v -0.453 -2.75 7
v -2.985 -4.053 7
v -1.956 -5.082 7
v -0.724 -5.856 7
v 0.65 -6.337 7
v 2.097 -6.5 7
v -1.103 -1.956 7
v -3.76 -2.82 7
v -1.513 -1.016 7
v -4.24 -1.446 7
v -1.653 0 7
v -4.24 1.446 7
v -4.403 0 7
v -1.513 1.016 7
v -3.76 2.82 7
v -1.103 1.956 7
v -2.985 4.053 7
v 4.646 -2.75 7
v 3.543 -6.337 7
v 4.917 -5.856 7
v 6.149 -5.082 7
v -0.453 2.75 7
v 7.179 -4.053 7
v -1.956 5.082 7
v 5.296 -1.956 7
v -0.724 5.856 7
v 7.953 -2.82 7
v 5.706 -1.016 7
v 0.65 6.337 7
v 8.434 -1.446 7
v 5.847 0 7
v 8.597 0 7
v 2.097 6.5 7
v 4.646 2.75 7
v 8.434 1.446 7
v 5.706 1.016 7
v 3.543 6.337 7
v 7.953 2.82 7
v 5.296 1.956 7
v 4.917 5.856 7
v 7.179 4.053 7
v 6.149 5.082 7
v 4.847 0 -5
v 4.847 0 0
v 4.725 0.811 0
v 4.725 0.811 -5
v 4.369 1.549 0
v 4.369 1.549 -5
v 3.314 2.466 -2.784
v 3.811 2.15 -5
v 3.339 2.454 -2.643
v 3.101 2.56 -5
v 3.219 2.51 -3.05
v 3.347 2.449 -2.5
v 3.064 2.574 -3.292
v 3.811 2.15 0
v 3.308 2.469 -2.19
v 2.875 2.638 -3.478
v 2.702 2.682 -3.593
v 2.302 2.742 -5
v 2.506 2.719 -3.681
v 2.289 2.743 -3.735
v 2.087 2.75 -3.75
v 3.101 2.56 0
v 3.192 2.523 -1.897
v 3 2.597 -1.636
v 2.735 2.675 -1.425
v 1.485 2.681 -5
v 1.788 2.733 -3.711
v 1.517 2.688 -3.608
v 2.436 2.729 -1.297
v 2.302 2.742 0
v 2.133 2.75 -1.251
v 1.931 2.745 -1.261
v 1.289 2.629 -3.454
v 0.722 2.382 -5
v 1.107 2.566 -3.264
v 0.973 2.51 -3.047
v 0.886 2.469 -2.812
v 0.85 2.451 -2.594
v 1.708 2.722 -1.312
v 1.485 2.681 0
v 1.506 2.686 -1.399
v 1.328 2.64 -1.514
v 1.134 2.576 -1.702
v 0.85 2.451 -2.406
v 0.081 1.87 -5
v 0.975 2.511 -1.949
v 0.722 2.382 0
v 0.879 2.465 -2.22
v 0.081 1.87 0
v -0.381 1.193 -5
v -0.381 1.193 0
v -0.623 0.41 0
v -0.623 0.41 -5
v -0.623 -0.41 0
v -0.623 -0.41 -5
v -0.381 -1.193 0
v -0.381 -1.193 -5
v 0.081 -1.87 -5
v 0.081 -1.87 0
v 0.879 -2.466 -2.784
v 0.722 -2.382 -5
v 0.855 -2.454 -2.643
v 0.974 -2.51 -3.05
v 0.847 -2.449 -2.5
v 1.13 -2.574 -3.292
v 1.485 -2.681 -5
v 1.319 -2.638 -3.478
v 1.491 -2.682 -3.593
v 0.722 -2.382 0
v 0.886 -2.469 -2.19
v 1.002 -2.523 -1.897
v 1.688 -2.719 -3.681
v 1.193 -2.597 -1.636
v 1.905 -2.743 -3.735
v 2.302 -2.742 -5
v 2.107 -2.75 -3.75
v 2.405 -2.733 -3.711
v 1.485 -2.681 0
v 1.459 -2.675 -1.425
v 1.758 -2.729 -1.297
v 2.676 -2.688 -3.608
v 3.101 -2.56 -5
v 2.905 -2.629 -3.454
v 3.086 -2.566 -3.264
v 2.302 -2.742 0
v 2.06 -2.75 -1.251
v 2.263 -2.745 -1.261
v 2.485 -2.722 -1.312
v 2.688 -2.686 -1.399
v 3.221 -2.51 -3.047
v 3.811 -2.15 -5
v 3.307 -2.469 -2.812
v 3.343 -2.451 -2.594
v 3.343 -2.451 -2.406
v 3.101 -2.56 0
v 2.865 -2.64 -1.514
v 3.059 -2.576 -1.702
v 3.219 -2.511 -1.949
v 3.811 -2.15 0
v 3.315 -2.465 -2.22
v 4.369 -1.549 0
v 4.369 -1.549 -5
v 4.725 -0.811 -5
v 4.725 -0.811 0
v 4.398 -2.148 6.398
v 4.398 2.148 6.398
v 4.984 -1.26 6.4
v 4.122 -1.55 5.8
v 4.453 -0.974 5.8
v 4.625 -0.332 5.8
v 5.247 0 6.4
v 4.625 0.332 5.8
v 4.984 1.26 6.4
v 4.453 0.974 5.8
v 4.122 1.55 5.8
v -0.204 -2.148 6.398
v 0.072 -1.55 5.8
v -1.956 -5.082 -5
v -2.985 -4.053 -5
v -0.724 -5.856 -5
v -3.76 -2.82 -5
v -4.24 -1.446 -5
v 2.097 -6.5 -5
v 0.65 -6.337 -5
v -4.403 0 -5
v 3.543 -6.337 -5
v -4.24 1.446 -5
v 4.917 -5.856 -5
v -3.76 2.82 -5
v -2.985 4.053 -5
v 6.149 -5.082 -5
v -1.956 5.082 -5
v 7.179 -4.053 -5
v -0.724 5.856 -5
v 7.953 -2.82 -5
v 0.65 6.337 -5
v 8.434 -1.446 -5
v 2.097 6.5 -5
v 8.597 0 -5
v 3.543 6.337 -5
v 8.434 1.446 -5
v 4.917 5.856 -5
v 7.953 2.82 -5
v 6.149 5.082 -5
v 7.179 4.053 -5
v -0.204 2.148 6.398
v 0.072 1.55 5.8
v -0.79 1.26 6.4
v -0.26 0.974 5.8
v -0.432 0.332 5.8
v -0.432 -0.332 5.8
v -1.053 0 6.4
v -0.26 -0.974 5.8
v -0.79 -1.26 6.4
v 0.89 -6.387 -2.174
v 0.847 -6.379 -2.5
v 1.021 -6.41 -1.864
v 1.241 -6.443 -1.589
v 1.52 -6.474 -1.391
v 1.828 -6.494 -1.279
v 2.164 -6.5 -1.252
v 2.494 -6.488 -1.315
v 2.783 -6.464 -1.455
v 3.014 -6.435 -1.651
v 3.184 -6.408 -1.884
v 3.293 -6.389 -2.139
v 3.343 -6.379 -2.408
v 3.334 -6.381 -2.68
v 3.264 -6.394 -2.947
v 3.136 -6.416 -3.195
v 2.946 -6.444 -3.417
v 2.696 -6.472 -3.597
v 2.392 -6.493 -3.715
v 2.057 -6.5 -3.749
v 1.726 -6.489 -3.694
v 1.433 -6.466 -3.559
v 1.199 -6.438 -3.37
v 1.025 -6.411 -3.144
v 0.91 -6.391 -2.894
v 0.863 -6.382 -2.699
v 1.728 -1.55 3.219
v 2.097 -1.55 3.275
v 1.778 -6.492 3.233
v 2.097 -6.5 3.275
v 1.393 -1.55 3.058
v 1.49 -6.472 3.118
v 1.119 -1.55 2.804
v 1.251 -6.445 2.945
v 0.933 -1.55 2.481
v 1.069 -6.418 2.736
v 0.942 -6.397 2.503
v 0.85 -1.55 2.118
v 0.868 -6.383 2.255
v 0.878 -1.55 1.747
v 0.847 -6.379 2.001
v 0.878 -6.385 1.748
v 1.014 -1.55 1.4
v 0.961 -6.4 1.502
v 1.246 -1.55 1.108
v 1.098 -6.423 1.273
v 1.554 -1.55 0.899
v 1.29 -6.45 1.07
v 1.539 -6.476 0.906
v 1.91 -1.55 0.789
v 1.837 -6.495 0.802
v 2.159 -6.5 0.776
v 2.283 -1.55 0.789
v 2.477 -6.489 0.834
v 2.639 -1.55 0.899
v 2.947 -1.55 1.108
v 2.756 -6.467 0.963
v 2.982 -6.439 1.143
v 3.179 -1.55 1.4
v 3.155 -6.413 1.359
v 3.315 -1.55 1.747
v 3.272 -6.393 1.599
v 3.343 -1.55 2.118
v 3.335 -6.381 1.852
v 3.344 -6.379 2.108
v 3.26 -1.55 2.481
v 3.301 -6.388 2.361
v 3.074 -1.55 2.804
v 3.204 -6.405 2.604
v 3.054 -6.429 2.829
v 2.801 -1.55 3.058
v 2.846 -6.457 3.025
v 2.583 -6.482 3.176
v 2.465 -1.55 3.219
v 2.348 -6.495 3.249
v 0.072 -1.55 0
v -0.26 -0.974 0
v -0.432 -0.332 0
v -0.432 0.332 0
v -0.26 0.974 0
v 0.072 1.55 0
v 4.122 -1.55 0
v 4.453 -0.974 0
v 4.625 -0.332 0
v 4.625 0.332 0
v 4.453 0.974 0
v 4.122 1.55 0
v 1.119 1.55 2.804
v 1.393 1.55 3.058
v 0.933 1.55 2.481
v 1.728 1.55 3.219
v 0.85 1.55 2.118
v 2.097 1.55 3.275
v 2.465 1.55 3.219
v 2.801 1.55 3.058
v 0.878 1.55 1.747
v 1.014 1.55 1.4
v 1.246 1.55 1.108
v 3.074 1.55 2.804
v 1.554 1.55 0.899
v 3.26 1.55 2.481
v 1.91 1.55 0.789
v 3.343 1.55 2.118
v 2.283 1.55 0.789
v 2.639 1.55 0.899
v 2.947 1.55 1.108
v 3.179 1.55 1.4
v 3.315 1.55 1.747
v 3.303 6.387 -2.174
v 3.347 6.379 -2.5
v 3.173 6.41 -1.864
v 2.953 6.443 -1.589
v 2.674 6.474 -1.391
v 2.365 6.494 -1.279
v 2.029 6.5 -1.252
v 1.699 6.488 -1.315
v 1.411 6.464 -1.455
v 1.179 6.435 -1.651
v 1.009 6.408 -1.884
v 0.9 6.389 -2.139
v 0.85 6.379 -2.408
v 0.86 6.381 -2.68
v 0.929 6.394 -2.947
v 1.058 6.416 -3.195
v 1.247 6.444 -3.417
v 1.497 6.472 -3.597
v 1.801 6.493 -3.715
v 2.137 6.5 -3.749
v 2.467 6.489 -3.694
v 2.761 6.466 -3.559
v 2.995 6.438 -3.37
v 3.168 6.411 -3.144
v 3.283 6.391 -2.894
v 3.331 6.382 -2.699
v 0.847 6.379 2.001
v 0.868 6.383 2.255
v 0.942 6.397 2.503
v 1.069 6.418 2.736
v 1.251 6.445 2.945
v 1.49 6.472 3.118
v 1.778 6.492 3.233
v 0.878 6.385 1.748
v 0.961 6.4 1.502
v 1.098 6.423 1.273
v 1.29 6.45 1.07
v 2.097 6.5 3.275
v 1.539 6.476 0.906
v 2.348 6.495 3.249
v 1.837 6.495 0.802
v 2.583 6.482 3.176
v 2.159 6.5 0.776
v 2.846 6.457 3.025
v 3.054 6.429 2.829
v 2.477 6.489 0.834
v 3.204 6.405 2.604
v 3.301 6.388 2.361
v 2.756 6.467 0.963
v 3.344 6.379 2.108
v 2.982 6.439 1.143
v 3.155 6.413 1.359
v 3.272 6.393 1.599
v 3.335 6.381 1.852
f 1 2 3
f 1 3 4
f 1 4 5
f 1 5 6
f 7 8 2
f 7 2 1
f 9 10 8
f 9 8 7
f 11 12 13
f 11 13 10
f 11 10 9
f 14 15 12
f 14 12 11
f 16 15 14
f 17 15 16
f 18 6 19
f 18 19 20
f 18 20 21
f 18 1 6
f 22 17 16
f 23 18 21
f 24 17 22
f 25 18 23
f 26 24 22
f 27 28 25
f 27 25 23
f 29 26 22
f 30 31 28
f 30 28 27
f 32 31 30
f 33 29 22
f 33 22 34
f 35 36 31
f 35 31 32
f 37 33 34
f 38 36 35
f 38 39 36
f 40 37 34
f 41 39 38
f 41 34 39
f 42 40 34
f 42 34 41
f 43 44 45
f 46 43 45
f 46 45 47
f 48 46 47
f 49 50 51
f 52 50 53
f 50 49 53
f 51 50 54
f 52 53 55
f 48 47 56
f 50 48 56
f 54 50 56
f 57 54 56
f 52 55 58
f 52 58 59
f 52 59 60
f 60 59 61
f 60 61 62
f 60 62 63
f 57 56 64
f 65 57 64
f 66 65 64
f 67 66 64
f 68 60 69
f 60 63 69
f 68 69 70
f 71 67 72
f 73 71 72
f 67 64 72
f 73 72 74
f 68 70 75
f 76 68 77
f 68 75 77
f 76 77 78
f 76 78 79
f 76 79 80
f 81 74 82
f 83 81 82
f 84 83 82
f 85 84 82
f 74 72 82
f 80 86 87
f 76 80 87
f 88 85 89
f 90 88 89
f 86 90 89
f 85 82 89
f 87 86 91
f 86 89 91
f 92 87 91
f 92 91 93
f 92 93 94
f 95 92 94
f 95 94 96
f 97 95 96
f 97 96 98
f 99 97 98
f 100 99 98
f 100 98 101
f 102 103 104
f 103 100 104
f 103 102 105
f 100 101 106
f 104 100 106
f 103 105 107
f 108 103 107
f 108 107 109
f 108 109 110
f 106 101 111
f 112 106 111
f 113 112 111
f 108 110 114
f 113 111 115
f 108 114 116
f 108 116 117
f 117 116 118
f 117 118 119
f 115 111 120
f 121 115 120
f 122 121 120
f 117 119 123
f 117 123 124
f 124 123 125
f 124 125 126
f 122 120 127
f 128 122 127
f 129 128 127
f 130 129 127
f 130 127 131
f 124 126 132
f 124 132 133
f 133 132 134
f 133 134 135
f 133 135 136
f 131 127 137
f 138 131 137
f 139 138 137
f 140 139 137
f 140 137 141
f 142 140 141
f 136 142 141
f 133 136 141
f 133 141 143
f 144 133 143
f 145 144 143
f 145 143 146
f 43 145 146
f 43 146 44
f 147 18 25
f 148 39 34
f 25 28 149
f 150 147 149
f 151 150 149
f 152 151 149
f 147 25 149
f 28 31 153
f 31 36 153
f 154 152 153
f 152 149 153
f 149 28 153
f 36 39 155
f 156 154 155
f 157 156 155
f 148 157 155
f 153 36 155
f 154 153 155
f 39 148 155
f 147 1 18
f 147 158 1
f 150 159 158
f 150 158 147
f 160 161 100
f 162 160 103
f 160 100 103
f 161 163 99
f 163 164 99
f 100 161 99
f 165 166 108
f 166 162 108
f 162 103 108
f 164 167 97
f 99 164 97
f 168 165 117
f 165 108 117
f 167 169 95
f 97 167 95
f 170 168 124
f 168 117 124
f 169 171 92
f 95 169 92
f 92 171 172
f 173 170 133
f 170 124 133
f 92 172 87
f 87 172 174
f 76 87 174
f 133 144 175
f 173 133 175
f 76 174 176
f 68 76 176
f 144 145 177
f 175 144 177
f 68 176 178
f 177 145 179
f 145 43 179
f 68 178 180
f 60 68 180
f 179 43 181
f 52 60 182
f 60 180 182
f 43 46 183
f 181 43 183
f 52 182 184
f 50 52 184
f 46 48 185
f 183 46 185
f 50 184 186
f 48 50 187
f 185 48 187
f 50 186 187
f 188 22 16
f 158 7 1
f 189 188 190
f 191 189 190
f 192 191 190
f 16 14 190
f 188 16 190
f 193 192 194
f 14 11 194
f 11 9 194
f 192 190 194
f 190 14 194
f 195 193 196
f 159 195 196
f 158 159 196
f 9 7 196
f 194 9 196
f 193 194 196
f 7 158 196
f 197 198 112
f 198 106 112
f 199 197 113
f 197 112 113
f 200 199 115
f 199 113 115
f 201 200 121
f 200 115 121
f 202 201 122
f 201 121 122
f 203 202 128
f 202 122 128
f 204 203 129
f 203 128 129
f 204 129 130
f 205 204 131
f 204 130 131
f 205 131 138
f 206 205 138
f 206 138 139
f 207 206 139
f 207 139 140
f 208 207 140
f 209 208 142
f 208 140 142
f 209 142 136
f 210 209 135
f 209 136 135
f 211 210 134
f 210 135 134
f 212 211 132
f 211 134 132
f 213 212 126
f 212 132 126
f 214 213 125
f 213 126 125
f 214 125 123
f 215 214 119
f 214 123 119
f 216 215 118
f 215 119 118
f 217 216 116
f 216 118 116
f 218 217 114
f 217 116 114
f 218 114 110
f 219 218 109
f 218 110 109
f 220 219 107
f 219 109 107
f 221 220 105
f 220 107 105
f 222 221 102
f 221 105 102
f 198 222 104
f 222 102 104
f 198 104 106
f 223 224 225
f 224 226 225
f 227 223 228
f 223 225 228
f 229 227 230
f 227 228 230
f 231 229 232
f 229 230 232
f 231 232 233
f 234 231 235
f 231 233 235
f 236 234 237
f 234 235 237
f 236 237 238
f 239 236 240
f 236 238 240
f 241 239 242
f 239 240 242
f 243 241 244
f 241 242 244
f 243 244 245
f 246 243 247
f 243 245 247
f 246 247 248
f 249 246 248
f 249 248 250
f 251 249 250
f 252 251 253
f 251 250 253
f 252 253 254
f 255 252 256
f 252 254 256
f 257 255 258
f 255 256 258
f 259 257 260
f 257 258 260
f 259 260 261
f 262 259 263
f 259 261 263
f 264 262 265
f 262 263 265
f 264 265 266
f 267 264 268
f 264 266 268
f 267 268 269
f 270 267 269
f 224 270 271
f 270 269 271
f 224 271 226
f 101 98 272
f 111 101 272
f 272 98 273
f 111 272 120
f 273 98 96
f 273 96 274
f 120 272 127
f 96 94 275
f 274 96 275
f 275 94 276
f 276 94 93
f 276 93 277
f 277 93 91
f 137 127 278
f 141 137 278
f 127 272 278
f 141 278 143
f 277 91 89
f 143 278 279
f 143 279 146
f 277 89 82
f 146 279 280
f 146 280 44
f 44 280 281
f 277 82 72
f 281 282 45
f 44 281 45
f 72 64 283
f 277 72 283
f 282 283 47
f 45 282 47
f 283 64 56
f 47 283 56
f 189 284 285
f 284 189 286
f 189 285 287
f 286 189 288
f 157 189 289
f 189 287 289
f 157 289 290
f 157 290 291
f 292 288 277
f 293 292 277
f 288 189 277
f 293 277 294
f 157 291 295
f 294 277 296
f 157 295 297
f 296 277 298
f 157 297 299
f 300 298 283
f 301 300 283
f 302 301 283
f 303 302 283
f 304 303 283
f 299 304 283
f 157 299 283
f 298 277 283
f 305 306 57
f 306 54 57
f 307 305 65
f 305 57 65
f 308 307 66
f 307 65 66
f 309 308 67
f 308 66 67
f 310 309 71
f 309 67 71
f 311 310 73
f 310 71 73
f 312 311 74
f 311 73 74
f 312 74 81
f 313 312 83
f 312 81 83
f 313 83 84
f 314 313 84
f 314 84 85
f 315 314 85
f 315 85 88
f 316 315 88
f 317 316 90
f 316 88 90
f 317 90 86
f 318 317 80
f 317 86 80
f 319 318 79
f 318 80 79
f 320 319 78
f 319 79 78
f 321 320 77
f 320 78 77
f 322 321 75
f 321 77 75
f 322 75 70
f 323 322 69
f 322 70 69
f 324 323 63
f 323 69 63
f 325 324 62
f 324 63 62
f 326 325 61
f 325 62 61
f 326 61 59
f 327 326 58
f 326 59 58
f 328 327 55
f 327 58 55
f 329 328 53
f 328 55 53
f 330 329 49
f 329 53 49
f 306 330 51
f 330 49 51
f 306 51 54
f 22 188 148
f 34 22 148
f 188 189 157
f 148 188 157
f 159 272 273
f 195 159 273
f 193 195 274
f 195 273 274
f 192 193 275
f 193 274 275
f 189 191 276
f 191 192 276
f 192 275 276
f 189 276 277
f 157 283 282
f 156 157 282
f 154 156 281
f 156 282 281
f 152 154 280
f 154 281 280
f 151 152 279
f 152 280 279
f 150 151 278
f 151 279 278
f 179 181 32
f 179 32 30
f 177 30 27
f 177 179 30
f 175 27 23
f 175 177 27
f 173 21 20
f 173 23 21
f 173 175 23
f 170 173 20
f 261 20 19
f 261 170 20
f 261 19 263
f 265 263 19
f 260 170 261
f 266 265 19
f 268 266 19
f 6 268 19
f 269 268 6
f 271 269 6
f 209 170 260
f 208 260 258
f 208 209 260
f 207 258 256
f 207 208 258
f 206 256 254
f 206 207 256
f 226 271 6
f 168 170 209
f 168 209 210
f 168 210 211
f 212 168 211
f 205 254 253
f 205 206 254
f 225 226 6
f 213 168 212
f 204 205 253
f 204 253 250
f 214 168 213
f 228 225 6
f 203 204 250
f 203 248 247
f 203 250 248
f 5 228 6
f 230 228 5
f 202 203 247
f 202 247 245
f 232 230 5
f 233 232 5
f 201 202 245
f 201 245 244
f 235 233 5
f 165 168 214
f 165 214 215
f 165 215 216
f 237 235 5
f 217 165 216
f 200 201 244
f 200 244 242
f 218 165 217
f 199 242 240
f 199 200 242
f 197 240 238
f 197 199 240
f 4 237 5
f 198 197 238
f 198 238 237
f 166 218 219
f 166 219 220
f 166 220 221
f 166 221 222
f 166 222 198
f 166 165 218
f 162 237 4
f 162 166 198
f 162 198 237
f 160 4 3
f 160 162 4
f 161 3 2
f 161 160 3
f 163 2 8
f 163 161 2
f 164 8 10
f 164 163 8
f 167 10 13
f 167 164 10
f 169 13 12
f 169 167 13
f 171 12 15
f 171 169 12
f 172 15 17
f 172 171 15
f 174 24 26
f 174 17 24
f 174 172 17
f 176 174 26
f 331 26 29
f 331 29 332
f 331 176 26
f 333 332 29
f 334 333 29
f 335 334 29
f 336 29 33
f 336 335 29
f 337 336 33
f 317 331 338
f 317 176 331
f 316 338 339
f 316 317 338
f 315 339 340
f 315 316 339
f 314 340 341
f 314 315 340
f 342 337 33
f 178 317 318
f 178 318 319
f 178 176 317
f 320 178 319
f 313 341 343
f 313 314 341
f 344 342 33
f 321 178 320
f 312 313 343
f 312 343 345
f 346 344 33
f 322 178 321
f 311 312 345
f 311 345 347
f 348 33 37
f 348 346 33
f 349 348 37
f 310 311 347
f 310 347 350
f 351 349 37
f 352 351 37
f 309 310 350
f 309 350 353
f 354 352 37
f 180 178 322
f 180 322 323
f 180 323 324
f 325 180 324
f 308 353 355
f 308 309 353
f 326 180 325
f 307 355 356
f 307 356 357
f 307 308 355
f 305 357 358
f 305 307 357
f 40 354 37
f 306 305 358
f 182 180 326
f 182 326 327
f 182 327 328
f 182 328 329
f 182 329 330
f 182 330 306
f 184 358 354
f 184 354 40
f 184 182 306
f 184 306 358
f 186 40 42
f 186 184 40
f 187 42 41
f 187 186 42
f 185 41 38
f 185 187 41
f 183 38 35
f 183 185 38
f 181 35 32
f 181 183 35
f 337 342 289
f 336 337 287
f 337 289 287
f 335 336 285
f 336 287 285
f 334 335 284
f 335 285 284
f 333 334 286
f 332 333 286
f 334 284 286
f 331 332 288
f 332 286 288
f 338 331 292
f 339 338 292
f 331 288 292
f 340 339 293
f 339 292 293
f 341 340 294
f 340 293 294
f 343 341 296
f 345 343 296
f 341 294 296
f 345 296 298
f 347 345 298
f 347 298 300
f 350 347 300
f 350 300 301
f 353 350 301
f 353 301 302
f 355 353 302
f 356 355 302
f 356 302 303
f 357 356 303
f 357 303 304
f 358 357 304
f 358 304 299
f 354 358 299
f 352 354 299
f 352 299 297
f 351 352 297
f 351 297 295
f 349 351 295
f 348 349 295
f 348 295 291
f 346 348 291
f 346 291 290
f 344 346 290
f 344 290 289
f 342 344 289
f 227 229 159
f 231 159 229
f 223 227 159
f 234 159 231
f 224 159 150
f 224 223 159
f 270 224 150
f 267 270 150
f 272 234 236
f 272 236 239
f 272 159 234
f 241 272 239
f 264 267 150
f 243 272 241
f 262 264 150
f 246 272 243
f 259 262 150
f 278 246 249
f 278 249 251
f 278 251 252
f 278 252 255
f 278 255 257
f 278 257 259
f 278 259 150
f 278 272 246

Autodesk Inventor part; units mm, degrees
ref_plane "YZ Plane" through (0, 0, 0) normal (1, 0, 0) x (0, 1, 0)
ref_plane "XZ Plane" through (0, 0, 0) normal (0, 1, 0) x (-1, 0, 0)
sketch "Sketch1" plane through (0, 0, 0) normal (0, 0, 1) x (1, 0, 0)
  line L0 (0.8467, -0.7217) -> (0.8467, 0.7217) construction
  line L1 (0.8467, 0.7217) -> (2.0967, 1.4434) construction
  line L2 (2.0967, 1.4434) -> (3.3467, 0.7217) construction
  line L3 (3.3467, 0.7217) -> (3.3467, -0.7217) construction
  line L4 (3.3467, -0.7217) -> (2.0967, -1.4434) construction
  line L5 (2.0967, -1.4434) -> (0.8467, -0.7217) construction
  circle A0 centre (2.0967, 0) radius 2.45 construction
  line L6 (4.8467, -1.5877) -> (3.4717, -2.3816) construction
  line L7 (15.0967, 3) -> (15.0967, -3) construction
  line L8 (-10.9033, 3) -> (-10.9033, -3) construction
  line L9 (-0.6533, 0) -> (-0.6533, 1.5877) construction
  circle A1 centre (2.0967, 0) radius 5
  circle A2 centre (2.0967, 0) radius 1.7 projected
  line L10 (-10.9033, -3) -> (15.0967, -3) projected
  line L11 (-10.9033, 3) -> (15.0967, 3) projected
  circle A3 centre (2.0967, 0) radius 2.75
  circle A4 centre (2.0967, 0) radius 6.5
  point P0 (0.4719, -0.5)
  point P1 (3.7215, -0.5)
  dimension "d10" = 5.5
  dimension "d13" = 13
ref_plane "Work Plane1" through (-20.8033, -6.3, -5.9) normal (0, 0, 1) x (1, 0, 0)
extrude "Extrusion1" add sketch "Sketch1" against normal blind 5 contours A1 L10 L11 | A1 L11 A4 L10 | L11 A1 | A1 L11 A4 | L10 A4 A1 | A1 L10 | A1 L10 A4 L11
sketch "Sketch2" plane through (2.0967, 0, 0) normal (0, 0, 1) x (1, 0, 0)
  line L0 (-2, 1.5) -> (2, 1.5) construction
  arc A0 (2.5, 0) -> (2, 1.5) centre (0, 0) ccw construction
  arc A1 (-2, 1.5) -> (-2.5, 0) centre (0, 0) ccw construction
  line L1 (2, -1.5) -> (-2, -1.5) construction
  arc A2 (-2.5, 0) -> (2.5, 0) centre (0, 0) ccw construction
  line L2 (2.0248, 1.55) -> (-2.0248, 1.55) construction
  arc A3 (-2.0248, 1.55) -> (-2.55, 0) centre (0, 0) ccw construction
  arc A4 (-2.55, 0) -> (2.55, 0) centre (0, 0) ccw construction
  arc A5 (2.55, 0) -> (2.0248, 1.55) centre (0, 0) ccw construction
  line L3 (-2.0248, 1.55) -> (2.0248, 1.55) construction
  line L4 (-2.0248, 1.55) -> (2.0248, 1.55)
  line L5 (-2.0248, -1.55) -> (2.0248, -1.55)
  arc A6 (-2.0248, 1.55) -> (-2.0248, -1.55) centre (0, 0) ccw
  arc A7 (2.0248, -1.55) -> (2.0248, 1.55) centre (0, 0) ccw
  circle A8 centre (0, 0) radius 6.5 projected
  point P0 (-2.0967, 0)
  dimension "d11" = 3.1
  dimension "d12" = 2.55
extrude "Extrusion2" add sketch "Sketch2" along normal blind 7
chamfer "Chamfer1" distance 1.2 angle 45 4 edges at (2.0967, 1.55, 7) (-0.4533, 0, 7) (2.0967, -1.55, 7) (4.6467, 0, 7)
sketch "Sketch3" plane through (0, 0, 0) normal (0, 1, 0) x (-1, 0, 0)
  line L0 (-4.6467, 0) -> (-4.6467, 5.8) projected
  line L1 (0.4533, 0) -> (0.4533, 5.8) projected
  line L2 (-8.5967, -5) -> (4.4033, -5) projected
  circle A0 centre (-2.0967, -2.5) radius 1.25
  line L3 (-8.5967, -5) -> (4.4033, -5) projected
  point P0 (0, 0)
  point P1 (-8.5967, 0)
  point P2 (4.4033, 0)
  dimension "d14" = 2.5
  dimension "d15" = 2.5
extrude "Extrusion3" cut sketch "Sketch3" against normal blind 10
pattern_circular "Circular Pattern1" count 2 over 360 about axis through (2.0967, 0, 0) along (0, 0, -1) of "Extrusion3"
sketch "Sketch4" plane through (0.0718, -1.55, 0) normal (0, 1, 0) x (1, 0, 0)
  line L0 (0, -5.8) -> (4.0497, -5.8) projected
  line L1 (-4.4752, -7) -> (8.5248, -7) projected
  line L2 (8.5248, 5) -> (-4.4752, 5) projected
  line L3 (4.0497, -5.8) -> (0, -5.8) projected
  line L4 (4.0497, 0) -> (4.0497, -5.8) projected
  line L5 (0, 0) -> (0, -5.8) projected
  circle A0 centre (2.0248, -2.0248) radius 2.0248
  line L6 (0, 0) -> (4.0497, 0) projected
  point P0 (-0.0718, 0)
  point P1 (3.2748, 2.5)
  point P2 (0.7748, 2.5)
hole "Hole1" at (2.0967, -1.55, 2.0248) direction (0, -1, 0) diameter 2.5 end through all both
properties part number "30_Coupling_Screw_28BYJ_M3_v2"
